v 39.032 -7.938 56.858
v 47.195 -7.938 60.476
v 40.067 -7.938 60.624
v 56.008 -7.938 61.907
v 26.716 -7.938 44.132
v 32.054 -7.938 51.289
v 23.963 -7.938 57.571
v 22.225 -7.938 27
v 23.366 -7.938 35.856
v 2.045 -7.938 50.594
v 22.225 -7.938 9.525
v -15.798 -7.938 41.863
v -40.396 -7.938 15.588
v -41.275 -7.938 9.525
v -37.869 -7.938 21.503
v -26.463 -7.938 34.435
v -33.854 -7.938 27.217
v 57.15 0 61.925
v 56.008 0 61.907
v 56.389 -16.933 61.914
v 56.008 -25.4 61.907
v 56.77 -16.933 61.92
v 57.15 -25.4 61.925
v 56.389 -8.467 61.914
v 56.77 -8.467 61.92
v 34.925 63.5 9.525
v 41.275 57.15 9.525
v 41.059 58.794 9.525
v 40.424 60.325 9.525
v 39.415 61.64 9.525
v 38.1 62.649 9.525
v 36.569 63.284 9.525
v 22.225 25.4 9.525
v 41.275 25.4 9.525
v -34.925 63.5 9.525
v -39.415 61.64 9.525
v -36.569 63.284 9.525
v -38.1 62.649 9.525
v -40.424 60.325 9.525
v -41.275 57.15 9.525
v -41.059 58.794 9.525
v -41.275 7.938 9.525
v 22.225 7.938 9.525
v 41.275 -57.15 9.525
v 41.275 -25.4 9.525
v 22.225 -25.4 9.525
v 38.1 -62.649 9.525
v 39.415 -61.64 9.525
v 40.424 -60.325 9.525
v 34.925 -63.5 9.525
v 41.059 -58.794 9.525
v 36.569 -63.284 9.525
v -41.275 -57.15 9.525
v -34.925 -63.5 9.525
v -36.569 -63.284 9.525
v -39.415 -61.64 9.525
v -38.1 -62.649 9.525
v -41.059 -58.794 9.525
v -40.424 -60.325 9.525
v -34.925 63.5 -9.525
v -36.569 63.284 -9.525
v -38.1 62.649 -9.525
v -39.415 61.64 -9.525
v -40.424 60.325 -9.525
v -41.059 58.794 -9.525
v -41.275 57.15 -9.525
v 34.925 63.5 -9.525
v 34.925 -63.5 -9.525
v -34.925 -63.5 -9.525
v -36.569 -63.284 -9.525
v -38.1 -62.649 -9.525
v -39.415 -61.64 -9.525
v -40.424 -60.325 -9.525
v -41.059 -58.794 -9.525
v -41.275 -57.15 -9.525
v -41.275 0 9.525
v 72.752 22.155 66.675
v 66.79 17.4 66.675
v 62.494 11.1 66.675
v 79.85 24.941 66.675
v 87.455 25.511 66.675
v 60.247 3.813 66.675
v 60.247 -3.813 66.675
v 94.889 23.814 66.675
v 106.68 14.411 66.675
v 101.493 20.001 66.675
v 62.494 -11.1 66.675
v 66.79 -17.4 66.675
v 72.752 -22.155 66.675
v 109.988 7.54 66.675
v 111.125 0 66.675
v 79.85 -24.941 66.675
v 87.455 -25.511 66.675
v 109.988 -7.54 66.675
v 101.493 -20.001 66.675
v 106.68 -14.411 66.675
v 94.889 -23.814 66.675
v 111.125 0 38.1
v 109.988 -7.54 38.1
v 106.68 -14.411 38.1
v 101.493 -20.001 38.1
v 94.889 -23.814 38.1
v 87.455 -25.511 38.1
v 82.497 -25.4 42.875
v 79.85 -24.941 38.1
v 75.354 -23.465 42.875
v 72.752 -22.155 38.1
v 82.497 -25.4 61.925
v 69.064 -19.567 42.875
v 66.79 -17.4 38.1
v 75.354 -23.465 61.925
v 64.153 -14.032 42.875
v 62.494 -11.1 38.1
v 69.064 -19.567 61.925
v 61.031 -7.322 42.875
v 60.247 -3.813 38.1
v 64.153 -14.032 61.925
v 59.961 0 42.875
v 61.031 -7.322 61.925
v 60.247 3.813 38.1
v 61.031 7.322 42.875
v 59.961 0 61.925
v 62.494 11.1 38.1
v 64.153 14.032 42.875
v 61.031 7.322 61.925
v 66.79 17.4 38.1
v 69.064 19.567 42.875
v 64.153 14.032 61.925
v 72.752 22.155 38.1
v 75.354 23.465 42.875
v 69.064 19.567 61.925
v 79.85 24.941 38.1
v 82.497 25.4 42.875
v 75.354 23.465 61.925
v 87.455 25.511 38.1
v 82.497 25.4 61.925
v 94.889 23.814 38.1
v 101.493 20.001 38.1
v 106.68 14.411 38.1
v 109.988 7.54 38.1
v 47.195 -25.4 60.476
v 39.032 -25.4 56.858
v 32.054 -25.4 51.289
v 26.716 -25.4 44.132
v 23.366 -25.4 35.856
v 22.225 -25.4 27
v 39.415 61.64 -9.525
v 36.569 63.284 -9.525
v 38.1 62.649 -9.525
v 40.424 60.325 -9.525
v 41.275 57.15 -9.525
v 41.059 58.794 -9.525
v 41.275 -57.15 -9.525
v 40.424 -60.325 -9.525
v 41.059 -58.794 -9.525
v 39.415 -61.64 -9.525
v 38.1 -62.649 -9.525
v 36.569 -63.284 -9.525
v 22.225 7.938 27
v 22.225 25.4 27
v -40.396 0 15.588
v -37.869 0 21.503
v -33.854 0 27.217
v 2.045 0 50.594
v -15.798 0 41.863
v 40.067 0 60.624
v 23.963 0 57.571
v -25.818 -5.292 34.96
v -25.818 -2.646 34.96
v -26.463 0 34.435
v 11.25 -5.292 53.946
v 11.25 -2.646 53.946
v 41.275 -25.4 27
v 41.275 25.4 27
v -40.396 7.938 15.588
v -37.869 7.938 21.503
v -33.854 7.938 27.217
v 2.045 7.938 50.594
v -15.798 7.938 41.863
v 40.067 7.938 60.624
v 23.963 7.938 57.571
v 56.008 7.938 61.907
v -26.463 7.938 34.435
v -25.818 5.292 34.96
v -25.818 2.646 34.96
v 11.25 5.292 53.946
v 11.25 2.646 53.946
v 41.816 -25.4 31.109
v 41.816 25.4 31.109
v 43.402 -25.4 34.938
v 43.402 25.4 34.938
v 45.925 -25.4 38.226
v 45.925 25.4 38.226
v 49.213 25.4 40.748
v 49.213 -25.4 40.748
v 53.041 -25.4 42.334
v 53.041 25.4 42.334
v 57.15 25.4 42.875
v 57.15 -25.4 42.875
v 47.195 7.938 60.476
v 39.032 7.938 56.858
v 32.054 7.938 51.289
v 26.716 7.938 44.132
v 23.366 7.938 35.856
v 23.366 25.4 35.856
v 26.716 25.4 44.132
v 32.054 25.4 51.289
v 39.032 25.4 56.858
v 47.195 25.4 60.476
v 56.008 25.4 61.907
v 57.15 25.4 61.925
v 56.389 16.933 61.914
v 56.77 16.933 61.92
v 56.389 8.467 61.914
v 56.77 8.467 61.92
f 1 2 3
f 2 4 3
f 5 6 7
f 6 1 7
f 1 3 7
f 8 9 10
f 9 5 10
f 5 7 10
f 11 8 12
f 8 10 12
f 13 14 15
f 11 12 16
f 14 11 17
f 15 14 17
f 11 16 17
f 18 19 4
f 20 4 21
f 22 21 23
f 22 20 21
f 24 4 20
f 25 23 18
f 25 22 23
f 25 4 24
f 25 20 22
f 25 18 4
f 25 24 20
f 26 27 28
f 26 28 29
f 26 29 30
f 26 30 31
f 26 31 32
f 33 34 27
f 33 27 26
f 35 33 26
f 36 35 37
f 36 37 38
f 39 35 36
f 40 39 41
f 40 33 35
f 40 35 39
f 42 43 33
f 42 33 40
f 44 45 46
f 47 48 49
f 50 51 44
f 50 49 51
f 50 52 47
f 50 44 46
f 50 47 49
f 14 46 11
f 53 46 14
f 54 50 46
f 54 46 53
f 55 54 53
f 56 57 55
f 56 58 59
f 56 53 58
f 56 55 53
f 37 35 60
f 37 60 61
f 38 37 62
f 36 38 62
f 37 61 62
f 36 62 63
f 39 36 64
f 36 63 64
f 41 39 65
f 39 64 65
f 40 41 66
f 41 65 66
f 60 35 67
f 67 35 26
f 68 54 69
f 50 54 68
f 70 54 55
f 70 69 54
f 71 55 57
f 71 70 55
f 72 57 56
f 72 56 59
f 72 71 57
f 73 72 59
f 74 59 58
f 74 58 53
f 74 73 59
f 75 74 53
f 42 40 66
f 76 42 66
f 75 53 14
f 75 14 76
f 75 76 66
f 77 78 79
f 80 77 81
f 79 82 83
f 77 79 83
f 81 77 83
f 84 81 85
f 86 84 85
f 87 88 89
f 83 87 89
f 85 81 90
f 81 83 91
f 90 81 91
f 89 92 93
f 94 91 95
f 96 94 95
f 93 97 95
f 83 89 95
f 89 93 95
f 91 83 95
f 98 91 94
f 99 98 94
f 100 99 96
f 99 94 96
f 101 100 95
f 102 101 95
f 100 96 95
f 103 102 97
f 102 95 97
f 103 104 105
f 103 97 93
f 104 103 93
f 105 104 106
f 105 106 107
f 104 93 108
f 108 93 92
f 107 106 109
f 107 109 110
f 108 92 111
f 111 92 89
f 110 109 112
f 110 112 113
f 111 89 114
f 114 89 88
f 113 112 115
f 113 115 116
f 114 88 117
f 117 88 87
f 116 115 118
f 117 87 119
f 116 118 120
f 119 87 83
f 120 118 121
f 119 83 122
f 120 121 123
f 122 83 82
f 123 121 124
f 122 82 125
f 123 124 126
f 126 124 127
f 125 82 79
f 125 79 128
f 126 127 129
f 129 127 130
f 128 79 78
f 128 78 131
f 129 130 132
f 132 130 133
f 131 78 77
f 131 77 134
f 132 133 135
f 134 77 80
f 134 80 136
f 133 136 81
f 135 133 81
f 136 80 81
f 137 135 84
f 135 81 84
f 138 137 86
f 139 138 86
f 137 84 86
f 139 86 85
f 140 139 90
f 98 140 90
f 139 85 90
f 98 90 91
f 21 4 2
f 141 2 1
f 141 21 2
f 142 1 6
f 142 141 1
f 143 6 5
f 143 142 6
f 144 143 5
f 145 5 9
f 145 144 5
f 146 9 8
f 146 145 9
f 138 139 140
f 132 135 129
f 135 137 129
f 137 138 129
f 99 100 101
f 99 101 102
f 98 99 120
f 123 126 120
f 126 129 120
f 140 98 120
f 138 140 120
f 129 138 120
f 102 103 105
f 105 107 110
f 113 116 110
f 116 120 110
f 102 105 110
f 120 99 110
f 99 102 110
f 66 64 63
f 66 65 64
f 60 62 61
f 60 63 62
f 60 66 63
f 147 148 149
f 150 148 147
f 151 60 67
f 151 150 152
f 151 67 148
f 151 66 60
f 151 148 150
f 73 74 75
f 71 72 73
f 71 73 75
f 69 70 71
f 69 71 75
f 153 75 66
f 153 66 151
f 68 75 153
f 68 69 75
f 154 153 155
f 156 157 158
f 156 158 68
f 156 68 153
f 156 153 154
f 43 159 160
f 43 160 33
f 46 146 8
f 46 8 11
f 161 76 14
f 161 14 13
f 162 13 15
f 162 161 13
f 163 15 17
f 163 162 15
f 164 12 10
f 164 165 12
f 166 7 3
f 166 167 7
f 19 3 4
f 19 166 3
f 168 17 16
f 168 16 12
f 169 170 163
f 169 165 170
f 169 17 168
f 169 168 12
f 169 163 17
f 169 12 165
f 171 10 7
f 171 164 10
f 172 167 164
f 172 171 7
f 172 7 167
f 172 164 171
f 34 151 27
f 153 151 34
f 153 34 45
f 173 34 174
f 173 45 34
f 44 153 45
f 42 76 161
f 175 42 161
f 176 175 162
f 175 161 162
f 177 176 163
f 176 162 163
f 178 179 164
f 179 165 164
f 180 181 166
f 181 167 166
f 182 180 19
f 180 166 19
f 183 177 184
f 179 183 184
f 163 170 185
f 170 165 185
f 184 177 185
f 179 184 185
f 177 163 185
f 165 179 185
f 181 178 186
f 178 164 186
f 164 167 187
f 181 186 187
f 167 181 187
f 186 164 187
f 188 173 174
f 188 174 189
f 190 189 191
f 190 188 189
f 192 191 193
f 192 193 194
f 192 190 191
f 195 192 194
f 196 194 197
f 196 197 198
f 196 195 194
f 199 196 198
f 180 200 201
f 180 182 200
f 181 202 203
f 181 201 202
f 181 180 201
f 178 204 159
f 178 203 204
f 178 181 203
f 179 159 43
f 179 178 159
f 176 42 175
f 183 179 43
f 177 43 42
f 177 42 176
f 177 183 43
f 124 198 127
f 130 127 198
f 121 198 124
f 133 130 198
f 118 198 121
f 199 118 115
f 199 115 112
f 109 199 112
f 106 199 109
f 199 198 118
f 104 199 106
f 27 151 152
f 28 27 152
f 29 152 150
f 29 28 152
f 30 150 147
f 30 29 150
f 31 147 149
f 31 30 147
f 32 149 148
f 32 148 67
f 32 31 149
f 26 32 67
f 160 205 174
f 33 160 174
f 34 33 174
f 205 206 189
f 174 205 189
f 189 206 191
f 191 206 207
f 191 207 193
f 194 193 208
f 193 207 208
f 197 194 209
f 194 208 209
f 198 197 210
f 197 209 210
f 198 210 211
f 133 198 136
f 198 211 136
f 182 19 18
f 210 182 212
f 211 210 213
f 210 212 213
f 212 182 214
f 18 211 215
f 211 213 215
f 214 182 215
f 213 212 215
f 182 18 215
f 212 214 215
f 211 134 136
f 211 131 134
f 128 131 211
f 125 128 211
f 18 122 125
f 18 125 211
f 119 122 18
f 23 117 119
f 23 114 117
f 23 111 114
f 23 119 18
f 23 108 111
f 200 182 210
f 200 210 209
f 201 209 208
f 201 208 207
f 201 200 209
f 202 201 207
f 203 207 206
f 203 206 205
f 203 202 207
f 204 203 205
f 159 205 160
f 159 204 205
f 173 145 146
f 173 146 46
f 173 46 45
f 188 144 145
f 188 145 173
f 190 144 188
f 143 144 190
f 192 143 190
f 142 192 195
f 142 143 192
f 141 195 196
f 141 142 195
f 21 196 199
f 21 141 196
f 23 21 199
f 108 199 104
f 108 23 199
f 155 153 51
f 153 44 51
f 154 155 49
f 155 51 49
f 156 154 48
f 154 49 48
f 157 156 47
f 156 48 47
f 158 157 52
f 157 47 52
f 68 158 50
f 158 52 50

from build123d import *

# Parameters (mm, degrees)
F1_DEPTH = 63.5
F0_W     = 25.2179650775
F0_H     = 19.05
F2_DEPTH = 25.4
F3_DEPTH = 7.9375
F5_R     = 6.35


# Not quite as in the source:
# - a feature names something its author has since deleted; it is built from what else it names


with BuildPart() as f1:
    # F0 (on Front) → F1 (new body, symmetric)
    with BuildSketch(Plane.XZ):
        Polygon((22.225, 9.525), (-41.275, 9.525), (-41.275, -9.525), (41.275, -9.525), (41.275, 9.525), align=None)
    extrude(amount=F1_DEPTH, both=True)

    # F0 (on Front) → F2 (join, symmetric)
    with BuildSketch(Plane.XZ):
        with BuildLine():
            Line((22.225, 27.0002), (22.225, 9.525))
            Line((22.225, 9.525), (41.275, 9.525))
            Line((41.275, 9.525), (41.275, 27.0002))
            ThreePointArc((41.275, 27.0002), (45.9246798487, 38.2255201513), (57.15, 42.8752))
            Line((57.15, 42.8752), (60.325, 42.8752))
            Line((60.325, 42.8752), (60.325, 61.9252))
            Line((60.325, 61.9252), (57.15, 61.9252))
            add(Edge.make_bspline(
                [(56.0083765395, 61.9065364001), (56.3896340439, 61.9145223536), (56.7701888152, 61.920748032), (57.15, 61.9252)],
                knots=[110.545873998, 110.545873998, 110.545873998, 110.545873998, 111.5045361635, 111.5045361635, 111.5045361635, 111.5045361635], degree=3))
            ThreePointArc((56.0083765395, 61.9065364001), (32.0539163976, 51.2889260436), (22.225, 27.0002))
        make_face()
        with Locations((72.9339825387, 52.4002)):
            Rectangle(F0_W, F0_H)
    extrude(amount=F2_DEPTH, both=True)

    # F0 (on Front) → F3 (join, symmetric)
    with BuildSketch(Plane.XZ):
        with BuildLine():
            add(Edge.make_bspline(
                [(-41.275, 9.525), (-41.2634975333, 36.6583816825), (12.04456367, 60.9856549384), (56.0083765395, 61.9065364001)],
                knots=[0, 0, 0, 0, 110.545873998, 110.545873998, 110.545873998, 110.545873998], degree=3))
            Line((-41.275, 9.525), (22.225, 9.525))
            Line((22.225, 9.525), (22.225, 27.0002))
            ThreePointArc((22.225, 27.0002), (32.0539163976, 51.2889260436), (56.0083765395, 61.9065364001))
        make_face()
    extrude(amount=F3_DEPTH, both=True)

    # F0 (on Front) → F4 (revolve)
    with BuildSketch(Plane.XZ):
        Polygon((85.5429650775, 66.675), (85.5429650775, 61.9252), (85.5429650775, 42.8752), (85.5429650775, 38.1), (111.125, 38.1), (111.125, 66.675), align=None)
    revolve(axis=Axis((85.5429650775, 0, 52.3875), (0, 0, -1)))

    # F5
    f5_edges = [f1.edges().sort_by_distance(p)[0] for p in [
        (41.275, -63.5, 0),
        (-41.275, -63.5, 0),
        (41.275, 63.5, 0),
        (-41.275, 63.5, 0),
    ]]
    fillet(f5_edges, radius=F5_R)


solid = f1.part
